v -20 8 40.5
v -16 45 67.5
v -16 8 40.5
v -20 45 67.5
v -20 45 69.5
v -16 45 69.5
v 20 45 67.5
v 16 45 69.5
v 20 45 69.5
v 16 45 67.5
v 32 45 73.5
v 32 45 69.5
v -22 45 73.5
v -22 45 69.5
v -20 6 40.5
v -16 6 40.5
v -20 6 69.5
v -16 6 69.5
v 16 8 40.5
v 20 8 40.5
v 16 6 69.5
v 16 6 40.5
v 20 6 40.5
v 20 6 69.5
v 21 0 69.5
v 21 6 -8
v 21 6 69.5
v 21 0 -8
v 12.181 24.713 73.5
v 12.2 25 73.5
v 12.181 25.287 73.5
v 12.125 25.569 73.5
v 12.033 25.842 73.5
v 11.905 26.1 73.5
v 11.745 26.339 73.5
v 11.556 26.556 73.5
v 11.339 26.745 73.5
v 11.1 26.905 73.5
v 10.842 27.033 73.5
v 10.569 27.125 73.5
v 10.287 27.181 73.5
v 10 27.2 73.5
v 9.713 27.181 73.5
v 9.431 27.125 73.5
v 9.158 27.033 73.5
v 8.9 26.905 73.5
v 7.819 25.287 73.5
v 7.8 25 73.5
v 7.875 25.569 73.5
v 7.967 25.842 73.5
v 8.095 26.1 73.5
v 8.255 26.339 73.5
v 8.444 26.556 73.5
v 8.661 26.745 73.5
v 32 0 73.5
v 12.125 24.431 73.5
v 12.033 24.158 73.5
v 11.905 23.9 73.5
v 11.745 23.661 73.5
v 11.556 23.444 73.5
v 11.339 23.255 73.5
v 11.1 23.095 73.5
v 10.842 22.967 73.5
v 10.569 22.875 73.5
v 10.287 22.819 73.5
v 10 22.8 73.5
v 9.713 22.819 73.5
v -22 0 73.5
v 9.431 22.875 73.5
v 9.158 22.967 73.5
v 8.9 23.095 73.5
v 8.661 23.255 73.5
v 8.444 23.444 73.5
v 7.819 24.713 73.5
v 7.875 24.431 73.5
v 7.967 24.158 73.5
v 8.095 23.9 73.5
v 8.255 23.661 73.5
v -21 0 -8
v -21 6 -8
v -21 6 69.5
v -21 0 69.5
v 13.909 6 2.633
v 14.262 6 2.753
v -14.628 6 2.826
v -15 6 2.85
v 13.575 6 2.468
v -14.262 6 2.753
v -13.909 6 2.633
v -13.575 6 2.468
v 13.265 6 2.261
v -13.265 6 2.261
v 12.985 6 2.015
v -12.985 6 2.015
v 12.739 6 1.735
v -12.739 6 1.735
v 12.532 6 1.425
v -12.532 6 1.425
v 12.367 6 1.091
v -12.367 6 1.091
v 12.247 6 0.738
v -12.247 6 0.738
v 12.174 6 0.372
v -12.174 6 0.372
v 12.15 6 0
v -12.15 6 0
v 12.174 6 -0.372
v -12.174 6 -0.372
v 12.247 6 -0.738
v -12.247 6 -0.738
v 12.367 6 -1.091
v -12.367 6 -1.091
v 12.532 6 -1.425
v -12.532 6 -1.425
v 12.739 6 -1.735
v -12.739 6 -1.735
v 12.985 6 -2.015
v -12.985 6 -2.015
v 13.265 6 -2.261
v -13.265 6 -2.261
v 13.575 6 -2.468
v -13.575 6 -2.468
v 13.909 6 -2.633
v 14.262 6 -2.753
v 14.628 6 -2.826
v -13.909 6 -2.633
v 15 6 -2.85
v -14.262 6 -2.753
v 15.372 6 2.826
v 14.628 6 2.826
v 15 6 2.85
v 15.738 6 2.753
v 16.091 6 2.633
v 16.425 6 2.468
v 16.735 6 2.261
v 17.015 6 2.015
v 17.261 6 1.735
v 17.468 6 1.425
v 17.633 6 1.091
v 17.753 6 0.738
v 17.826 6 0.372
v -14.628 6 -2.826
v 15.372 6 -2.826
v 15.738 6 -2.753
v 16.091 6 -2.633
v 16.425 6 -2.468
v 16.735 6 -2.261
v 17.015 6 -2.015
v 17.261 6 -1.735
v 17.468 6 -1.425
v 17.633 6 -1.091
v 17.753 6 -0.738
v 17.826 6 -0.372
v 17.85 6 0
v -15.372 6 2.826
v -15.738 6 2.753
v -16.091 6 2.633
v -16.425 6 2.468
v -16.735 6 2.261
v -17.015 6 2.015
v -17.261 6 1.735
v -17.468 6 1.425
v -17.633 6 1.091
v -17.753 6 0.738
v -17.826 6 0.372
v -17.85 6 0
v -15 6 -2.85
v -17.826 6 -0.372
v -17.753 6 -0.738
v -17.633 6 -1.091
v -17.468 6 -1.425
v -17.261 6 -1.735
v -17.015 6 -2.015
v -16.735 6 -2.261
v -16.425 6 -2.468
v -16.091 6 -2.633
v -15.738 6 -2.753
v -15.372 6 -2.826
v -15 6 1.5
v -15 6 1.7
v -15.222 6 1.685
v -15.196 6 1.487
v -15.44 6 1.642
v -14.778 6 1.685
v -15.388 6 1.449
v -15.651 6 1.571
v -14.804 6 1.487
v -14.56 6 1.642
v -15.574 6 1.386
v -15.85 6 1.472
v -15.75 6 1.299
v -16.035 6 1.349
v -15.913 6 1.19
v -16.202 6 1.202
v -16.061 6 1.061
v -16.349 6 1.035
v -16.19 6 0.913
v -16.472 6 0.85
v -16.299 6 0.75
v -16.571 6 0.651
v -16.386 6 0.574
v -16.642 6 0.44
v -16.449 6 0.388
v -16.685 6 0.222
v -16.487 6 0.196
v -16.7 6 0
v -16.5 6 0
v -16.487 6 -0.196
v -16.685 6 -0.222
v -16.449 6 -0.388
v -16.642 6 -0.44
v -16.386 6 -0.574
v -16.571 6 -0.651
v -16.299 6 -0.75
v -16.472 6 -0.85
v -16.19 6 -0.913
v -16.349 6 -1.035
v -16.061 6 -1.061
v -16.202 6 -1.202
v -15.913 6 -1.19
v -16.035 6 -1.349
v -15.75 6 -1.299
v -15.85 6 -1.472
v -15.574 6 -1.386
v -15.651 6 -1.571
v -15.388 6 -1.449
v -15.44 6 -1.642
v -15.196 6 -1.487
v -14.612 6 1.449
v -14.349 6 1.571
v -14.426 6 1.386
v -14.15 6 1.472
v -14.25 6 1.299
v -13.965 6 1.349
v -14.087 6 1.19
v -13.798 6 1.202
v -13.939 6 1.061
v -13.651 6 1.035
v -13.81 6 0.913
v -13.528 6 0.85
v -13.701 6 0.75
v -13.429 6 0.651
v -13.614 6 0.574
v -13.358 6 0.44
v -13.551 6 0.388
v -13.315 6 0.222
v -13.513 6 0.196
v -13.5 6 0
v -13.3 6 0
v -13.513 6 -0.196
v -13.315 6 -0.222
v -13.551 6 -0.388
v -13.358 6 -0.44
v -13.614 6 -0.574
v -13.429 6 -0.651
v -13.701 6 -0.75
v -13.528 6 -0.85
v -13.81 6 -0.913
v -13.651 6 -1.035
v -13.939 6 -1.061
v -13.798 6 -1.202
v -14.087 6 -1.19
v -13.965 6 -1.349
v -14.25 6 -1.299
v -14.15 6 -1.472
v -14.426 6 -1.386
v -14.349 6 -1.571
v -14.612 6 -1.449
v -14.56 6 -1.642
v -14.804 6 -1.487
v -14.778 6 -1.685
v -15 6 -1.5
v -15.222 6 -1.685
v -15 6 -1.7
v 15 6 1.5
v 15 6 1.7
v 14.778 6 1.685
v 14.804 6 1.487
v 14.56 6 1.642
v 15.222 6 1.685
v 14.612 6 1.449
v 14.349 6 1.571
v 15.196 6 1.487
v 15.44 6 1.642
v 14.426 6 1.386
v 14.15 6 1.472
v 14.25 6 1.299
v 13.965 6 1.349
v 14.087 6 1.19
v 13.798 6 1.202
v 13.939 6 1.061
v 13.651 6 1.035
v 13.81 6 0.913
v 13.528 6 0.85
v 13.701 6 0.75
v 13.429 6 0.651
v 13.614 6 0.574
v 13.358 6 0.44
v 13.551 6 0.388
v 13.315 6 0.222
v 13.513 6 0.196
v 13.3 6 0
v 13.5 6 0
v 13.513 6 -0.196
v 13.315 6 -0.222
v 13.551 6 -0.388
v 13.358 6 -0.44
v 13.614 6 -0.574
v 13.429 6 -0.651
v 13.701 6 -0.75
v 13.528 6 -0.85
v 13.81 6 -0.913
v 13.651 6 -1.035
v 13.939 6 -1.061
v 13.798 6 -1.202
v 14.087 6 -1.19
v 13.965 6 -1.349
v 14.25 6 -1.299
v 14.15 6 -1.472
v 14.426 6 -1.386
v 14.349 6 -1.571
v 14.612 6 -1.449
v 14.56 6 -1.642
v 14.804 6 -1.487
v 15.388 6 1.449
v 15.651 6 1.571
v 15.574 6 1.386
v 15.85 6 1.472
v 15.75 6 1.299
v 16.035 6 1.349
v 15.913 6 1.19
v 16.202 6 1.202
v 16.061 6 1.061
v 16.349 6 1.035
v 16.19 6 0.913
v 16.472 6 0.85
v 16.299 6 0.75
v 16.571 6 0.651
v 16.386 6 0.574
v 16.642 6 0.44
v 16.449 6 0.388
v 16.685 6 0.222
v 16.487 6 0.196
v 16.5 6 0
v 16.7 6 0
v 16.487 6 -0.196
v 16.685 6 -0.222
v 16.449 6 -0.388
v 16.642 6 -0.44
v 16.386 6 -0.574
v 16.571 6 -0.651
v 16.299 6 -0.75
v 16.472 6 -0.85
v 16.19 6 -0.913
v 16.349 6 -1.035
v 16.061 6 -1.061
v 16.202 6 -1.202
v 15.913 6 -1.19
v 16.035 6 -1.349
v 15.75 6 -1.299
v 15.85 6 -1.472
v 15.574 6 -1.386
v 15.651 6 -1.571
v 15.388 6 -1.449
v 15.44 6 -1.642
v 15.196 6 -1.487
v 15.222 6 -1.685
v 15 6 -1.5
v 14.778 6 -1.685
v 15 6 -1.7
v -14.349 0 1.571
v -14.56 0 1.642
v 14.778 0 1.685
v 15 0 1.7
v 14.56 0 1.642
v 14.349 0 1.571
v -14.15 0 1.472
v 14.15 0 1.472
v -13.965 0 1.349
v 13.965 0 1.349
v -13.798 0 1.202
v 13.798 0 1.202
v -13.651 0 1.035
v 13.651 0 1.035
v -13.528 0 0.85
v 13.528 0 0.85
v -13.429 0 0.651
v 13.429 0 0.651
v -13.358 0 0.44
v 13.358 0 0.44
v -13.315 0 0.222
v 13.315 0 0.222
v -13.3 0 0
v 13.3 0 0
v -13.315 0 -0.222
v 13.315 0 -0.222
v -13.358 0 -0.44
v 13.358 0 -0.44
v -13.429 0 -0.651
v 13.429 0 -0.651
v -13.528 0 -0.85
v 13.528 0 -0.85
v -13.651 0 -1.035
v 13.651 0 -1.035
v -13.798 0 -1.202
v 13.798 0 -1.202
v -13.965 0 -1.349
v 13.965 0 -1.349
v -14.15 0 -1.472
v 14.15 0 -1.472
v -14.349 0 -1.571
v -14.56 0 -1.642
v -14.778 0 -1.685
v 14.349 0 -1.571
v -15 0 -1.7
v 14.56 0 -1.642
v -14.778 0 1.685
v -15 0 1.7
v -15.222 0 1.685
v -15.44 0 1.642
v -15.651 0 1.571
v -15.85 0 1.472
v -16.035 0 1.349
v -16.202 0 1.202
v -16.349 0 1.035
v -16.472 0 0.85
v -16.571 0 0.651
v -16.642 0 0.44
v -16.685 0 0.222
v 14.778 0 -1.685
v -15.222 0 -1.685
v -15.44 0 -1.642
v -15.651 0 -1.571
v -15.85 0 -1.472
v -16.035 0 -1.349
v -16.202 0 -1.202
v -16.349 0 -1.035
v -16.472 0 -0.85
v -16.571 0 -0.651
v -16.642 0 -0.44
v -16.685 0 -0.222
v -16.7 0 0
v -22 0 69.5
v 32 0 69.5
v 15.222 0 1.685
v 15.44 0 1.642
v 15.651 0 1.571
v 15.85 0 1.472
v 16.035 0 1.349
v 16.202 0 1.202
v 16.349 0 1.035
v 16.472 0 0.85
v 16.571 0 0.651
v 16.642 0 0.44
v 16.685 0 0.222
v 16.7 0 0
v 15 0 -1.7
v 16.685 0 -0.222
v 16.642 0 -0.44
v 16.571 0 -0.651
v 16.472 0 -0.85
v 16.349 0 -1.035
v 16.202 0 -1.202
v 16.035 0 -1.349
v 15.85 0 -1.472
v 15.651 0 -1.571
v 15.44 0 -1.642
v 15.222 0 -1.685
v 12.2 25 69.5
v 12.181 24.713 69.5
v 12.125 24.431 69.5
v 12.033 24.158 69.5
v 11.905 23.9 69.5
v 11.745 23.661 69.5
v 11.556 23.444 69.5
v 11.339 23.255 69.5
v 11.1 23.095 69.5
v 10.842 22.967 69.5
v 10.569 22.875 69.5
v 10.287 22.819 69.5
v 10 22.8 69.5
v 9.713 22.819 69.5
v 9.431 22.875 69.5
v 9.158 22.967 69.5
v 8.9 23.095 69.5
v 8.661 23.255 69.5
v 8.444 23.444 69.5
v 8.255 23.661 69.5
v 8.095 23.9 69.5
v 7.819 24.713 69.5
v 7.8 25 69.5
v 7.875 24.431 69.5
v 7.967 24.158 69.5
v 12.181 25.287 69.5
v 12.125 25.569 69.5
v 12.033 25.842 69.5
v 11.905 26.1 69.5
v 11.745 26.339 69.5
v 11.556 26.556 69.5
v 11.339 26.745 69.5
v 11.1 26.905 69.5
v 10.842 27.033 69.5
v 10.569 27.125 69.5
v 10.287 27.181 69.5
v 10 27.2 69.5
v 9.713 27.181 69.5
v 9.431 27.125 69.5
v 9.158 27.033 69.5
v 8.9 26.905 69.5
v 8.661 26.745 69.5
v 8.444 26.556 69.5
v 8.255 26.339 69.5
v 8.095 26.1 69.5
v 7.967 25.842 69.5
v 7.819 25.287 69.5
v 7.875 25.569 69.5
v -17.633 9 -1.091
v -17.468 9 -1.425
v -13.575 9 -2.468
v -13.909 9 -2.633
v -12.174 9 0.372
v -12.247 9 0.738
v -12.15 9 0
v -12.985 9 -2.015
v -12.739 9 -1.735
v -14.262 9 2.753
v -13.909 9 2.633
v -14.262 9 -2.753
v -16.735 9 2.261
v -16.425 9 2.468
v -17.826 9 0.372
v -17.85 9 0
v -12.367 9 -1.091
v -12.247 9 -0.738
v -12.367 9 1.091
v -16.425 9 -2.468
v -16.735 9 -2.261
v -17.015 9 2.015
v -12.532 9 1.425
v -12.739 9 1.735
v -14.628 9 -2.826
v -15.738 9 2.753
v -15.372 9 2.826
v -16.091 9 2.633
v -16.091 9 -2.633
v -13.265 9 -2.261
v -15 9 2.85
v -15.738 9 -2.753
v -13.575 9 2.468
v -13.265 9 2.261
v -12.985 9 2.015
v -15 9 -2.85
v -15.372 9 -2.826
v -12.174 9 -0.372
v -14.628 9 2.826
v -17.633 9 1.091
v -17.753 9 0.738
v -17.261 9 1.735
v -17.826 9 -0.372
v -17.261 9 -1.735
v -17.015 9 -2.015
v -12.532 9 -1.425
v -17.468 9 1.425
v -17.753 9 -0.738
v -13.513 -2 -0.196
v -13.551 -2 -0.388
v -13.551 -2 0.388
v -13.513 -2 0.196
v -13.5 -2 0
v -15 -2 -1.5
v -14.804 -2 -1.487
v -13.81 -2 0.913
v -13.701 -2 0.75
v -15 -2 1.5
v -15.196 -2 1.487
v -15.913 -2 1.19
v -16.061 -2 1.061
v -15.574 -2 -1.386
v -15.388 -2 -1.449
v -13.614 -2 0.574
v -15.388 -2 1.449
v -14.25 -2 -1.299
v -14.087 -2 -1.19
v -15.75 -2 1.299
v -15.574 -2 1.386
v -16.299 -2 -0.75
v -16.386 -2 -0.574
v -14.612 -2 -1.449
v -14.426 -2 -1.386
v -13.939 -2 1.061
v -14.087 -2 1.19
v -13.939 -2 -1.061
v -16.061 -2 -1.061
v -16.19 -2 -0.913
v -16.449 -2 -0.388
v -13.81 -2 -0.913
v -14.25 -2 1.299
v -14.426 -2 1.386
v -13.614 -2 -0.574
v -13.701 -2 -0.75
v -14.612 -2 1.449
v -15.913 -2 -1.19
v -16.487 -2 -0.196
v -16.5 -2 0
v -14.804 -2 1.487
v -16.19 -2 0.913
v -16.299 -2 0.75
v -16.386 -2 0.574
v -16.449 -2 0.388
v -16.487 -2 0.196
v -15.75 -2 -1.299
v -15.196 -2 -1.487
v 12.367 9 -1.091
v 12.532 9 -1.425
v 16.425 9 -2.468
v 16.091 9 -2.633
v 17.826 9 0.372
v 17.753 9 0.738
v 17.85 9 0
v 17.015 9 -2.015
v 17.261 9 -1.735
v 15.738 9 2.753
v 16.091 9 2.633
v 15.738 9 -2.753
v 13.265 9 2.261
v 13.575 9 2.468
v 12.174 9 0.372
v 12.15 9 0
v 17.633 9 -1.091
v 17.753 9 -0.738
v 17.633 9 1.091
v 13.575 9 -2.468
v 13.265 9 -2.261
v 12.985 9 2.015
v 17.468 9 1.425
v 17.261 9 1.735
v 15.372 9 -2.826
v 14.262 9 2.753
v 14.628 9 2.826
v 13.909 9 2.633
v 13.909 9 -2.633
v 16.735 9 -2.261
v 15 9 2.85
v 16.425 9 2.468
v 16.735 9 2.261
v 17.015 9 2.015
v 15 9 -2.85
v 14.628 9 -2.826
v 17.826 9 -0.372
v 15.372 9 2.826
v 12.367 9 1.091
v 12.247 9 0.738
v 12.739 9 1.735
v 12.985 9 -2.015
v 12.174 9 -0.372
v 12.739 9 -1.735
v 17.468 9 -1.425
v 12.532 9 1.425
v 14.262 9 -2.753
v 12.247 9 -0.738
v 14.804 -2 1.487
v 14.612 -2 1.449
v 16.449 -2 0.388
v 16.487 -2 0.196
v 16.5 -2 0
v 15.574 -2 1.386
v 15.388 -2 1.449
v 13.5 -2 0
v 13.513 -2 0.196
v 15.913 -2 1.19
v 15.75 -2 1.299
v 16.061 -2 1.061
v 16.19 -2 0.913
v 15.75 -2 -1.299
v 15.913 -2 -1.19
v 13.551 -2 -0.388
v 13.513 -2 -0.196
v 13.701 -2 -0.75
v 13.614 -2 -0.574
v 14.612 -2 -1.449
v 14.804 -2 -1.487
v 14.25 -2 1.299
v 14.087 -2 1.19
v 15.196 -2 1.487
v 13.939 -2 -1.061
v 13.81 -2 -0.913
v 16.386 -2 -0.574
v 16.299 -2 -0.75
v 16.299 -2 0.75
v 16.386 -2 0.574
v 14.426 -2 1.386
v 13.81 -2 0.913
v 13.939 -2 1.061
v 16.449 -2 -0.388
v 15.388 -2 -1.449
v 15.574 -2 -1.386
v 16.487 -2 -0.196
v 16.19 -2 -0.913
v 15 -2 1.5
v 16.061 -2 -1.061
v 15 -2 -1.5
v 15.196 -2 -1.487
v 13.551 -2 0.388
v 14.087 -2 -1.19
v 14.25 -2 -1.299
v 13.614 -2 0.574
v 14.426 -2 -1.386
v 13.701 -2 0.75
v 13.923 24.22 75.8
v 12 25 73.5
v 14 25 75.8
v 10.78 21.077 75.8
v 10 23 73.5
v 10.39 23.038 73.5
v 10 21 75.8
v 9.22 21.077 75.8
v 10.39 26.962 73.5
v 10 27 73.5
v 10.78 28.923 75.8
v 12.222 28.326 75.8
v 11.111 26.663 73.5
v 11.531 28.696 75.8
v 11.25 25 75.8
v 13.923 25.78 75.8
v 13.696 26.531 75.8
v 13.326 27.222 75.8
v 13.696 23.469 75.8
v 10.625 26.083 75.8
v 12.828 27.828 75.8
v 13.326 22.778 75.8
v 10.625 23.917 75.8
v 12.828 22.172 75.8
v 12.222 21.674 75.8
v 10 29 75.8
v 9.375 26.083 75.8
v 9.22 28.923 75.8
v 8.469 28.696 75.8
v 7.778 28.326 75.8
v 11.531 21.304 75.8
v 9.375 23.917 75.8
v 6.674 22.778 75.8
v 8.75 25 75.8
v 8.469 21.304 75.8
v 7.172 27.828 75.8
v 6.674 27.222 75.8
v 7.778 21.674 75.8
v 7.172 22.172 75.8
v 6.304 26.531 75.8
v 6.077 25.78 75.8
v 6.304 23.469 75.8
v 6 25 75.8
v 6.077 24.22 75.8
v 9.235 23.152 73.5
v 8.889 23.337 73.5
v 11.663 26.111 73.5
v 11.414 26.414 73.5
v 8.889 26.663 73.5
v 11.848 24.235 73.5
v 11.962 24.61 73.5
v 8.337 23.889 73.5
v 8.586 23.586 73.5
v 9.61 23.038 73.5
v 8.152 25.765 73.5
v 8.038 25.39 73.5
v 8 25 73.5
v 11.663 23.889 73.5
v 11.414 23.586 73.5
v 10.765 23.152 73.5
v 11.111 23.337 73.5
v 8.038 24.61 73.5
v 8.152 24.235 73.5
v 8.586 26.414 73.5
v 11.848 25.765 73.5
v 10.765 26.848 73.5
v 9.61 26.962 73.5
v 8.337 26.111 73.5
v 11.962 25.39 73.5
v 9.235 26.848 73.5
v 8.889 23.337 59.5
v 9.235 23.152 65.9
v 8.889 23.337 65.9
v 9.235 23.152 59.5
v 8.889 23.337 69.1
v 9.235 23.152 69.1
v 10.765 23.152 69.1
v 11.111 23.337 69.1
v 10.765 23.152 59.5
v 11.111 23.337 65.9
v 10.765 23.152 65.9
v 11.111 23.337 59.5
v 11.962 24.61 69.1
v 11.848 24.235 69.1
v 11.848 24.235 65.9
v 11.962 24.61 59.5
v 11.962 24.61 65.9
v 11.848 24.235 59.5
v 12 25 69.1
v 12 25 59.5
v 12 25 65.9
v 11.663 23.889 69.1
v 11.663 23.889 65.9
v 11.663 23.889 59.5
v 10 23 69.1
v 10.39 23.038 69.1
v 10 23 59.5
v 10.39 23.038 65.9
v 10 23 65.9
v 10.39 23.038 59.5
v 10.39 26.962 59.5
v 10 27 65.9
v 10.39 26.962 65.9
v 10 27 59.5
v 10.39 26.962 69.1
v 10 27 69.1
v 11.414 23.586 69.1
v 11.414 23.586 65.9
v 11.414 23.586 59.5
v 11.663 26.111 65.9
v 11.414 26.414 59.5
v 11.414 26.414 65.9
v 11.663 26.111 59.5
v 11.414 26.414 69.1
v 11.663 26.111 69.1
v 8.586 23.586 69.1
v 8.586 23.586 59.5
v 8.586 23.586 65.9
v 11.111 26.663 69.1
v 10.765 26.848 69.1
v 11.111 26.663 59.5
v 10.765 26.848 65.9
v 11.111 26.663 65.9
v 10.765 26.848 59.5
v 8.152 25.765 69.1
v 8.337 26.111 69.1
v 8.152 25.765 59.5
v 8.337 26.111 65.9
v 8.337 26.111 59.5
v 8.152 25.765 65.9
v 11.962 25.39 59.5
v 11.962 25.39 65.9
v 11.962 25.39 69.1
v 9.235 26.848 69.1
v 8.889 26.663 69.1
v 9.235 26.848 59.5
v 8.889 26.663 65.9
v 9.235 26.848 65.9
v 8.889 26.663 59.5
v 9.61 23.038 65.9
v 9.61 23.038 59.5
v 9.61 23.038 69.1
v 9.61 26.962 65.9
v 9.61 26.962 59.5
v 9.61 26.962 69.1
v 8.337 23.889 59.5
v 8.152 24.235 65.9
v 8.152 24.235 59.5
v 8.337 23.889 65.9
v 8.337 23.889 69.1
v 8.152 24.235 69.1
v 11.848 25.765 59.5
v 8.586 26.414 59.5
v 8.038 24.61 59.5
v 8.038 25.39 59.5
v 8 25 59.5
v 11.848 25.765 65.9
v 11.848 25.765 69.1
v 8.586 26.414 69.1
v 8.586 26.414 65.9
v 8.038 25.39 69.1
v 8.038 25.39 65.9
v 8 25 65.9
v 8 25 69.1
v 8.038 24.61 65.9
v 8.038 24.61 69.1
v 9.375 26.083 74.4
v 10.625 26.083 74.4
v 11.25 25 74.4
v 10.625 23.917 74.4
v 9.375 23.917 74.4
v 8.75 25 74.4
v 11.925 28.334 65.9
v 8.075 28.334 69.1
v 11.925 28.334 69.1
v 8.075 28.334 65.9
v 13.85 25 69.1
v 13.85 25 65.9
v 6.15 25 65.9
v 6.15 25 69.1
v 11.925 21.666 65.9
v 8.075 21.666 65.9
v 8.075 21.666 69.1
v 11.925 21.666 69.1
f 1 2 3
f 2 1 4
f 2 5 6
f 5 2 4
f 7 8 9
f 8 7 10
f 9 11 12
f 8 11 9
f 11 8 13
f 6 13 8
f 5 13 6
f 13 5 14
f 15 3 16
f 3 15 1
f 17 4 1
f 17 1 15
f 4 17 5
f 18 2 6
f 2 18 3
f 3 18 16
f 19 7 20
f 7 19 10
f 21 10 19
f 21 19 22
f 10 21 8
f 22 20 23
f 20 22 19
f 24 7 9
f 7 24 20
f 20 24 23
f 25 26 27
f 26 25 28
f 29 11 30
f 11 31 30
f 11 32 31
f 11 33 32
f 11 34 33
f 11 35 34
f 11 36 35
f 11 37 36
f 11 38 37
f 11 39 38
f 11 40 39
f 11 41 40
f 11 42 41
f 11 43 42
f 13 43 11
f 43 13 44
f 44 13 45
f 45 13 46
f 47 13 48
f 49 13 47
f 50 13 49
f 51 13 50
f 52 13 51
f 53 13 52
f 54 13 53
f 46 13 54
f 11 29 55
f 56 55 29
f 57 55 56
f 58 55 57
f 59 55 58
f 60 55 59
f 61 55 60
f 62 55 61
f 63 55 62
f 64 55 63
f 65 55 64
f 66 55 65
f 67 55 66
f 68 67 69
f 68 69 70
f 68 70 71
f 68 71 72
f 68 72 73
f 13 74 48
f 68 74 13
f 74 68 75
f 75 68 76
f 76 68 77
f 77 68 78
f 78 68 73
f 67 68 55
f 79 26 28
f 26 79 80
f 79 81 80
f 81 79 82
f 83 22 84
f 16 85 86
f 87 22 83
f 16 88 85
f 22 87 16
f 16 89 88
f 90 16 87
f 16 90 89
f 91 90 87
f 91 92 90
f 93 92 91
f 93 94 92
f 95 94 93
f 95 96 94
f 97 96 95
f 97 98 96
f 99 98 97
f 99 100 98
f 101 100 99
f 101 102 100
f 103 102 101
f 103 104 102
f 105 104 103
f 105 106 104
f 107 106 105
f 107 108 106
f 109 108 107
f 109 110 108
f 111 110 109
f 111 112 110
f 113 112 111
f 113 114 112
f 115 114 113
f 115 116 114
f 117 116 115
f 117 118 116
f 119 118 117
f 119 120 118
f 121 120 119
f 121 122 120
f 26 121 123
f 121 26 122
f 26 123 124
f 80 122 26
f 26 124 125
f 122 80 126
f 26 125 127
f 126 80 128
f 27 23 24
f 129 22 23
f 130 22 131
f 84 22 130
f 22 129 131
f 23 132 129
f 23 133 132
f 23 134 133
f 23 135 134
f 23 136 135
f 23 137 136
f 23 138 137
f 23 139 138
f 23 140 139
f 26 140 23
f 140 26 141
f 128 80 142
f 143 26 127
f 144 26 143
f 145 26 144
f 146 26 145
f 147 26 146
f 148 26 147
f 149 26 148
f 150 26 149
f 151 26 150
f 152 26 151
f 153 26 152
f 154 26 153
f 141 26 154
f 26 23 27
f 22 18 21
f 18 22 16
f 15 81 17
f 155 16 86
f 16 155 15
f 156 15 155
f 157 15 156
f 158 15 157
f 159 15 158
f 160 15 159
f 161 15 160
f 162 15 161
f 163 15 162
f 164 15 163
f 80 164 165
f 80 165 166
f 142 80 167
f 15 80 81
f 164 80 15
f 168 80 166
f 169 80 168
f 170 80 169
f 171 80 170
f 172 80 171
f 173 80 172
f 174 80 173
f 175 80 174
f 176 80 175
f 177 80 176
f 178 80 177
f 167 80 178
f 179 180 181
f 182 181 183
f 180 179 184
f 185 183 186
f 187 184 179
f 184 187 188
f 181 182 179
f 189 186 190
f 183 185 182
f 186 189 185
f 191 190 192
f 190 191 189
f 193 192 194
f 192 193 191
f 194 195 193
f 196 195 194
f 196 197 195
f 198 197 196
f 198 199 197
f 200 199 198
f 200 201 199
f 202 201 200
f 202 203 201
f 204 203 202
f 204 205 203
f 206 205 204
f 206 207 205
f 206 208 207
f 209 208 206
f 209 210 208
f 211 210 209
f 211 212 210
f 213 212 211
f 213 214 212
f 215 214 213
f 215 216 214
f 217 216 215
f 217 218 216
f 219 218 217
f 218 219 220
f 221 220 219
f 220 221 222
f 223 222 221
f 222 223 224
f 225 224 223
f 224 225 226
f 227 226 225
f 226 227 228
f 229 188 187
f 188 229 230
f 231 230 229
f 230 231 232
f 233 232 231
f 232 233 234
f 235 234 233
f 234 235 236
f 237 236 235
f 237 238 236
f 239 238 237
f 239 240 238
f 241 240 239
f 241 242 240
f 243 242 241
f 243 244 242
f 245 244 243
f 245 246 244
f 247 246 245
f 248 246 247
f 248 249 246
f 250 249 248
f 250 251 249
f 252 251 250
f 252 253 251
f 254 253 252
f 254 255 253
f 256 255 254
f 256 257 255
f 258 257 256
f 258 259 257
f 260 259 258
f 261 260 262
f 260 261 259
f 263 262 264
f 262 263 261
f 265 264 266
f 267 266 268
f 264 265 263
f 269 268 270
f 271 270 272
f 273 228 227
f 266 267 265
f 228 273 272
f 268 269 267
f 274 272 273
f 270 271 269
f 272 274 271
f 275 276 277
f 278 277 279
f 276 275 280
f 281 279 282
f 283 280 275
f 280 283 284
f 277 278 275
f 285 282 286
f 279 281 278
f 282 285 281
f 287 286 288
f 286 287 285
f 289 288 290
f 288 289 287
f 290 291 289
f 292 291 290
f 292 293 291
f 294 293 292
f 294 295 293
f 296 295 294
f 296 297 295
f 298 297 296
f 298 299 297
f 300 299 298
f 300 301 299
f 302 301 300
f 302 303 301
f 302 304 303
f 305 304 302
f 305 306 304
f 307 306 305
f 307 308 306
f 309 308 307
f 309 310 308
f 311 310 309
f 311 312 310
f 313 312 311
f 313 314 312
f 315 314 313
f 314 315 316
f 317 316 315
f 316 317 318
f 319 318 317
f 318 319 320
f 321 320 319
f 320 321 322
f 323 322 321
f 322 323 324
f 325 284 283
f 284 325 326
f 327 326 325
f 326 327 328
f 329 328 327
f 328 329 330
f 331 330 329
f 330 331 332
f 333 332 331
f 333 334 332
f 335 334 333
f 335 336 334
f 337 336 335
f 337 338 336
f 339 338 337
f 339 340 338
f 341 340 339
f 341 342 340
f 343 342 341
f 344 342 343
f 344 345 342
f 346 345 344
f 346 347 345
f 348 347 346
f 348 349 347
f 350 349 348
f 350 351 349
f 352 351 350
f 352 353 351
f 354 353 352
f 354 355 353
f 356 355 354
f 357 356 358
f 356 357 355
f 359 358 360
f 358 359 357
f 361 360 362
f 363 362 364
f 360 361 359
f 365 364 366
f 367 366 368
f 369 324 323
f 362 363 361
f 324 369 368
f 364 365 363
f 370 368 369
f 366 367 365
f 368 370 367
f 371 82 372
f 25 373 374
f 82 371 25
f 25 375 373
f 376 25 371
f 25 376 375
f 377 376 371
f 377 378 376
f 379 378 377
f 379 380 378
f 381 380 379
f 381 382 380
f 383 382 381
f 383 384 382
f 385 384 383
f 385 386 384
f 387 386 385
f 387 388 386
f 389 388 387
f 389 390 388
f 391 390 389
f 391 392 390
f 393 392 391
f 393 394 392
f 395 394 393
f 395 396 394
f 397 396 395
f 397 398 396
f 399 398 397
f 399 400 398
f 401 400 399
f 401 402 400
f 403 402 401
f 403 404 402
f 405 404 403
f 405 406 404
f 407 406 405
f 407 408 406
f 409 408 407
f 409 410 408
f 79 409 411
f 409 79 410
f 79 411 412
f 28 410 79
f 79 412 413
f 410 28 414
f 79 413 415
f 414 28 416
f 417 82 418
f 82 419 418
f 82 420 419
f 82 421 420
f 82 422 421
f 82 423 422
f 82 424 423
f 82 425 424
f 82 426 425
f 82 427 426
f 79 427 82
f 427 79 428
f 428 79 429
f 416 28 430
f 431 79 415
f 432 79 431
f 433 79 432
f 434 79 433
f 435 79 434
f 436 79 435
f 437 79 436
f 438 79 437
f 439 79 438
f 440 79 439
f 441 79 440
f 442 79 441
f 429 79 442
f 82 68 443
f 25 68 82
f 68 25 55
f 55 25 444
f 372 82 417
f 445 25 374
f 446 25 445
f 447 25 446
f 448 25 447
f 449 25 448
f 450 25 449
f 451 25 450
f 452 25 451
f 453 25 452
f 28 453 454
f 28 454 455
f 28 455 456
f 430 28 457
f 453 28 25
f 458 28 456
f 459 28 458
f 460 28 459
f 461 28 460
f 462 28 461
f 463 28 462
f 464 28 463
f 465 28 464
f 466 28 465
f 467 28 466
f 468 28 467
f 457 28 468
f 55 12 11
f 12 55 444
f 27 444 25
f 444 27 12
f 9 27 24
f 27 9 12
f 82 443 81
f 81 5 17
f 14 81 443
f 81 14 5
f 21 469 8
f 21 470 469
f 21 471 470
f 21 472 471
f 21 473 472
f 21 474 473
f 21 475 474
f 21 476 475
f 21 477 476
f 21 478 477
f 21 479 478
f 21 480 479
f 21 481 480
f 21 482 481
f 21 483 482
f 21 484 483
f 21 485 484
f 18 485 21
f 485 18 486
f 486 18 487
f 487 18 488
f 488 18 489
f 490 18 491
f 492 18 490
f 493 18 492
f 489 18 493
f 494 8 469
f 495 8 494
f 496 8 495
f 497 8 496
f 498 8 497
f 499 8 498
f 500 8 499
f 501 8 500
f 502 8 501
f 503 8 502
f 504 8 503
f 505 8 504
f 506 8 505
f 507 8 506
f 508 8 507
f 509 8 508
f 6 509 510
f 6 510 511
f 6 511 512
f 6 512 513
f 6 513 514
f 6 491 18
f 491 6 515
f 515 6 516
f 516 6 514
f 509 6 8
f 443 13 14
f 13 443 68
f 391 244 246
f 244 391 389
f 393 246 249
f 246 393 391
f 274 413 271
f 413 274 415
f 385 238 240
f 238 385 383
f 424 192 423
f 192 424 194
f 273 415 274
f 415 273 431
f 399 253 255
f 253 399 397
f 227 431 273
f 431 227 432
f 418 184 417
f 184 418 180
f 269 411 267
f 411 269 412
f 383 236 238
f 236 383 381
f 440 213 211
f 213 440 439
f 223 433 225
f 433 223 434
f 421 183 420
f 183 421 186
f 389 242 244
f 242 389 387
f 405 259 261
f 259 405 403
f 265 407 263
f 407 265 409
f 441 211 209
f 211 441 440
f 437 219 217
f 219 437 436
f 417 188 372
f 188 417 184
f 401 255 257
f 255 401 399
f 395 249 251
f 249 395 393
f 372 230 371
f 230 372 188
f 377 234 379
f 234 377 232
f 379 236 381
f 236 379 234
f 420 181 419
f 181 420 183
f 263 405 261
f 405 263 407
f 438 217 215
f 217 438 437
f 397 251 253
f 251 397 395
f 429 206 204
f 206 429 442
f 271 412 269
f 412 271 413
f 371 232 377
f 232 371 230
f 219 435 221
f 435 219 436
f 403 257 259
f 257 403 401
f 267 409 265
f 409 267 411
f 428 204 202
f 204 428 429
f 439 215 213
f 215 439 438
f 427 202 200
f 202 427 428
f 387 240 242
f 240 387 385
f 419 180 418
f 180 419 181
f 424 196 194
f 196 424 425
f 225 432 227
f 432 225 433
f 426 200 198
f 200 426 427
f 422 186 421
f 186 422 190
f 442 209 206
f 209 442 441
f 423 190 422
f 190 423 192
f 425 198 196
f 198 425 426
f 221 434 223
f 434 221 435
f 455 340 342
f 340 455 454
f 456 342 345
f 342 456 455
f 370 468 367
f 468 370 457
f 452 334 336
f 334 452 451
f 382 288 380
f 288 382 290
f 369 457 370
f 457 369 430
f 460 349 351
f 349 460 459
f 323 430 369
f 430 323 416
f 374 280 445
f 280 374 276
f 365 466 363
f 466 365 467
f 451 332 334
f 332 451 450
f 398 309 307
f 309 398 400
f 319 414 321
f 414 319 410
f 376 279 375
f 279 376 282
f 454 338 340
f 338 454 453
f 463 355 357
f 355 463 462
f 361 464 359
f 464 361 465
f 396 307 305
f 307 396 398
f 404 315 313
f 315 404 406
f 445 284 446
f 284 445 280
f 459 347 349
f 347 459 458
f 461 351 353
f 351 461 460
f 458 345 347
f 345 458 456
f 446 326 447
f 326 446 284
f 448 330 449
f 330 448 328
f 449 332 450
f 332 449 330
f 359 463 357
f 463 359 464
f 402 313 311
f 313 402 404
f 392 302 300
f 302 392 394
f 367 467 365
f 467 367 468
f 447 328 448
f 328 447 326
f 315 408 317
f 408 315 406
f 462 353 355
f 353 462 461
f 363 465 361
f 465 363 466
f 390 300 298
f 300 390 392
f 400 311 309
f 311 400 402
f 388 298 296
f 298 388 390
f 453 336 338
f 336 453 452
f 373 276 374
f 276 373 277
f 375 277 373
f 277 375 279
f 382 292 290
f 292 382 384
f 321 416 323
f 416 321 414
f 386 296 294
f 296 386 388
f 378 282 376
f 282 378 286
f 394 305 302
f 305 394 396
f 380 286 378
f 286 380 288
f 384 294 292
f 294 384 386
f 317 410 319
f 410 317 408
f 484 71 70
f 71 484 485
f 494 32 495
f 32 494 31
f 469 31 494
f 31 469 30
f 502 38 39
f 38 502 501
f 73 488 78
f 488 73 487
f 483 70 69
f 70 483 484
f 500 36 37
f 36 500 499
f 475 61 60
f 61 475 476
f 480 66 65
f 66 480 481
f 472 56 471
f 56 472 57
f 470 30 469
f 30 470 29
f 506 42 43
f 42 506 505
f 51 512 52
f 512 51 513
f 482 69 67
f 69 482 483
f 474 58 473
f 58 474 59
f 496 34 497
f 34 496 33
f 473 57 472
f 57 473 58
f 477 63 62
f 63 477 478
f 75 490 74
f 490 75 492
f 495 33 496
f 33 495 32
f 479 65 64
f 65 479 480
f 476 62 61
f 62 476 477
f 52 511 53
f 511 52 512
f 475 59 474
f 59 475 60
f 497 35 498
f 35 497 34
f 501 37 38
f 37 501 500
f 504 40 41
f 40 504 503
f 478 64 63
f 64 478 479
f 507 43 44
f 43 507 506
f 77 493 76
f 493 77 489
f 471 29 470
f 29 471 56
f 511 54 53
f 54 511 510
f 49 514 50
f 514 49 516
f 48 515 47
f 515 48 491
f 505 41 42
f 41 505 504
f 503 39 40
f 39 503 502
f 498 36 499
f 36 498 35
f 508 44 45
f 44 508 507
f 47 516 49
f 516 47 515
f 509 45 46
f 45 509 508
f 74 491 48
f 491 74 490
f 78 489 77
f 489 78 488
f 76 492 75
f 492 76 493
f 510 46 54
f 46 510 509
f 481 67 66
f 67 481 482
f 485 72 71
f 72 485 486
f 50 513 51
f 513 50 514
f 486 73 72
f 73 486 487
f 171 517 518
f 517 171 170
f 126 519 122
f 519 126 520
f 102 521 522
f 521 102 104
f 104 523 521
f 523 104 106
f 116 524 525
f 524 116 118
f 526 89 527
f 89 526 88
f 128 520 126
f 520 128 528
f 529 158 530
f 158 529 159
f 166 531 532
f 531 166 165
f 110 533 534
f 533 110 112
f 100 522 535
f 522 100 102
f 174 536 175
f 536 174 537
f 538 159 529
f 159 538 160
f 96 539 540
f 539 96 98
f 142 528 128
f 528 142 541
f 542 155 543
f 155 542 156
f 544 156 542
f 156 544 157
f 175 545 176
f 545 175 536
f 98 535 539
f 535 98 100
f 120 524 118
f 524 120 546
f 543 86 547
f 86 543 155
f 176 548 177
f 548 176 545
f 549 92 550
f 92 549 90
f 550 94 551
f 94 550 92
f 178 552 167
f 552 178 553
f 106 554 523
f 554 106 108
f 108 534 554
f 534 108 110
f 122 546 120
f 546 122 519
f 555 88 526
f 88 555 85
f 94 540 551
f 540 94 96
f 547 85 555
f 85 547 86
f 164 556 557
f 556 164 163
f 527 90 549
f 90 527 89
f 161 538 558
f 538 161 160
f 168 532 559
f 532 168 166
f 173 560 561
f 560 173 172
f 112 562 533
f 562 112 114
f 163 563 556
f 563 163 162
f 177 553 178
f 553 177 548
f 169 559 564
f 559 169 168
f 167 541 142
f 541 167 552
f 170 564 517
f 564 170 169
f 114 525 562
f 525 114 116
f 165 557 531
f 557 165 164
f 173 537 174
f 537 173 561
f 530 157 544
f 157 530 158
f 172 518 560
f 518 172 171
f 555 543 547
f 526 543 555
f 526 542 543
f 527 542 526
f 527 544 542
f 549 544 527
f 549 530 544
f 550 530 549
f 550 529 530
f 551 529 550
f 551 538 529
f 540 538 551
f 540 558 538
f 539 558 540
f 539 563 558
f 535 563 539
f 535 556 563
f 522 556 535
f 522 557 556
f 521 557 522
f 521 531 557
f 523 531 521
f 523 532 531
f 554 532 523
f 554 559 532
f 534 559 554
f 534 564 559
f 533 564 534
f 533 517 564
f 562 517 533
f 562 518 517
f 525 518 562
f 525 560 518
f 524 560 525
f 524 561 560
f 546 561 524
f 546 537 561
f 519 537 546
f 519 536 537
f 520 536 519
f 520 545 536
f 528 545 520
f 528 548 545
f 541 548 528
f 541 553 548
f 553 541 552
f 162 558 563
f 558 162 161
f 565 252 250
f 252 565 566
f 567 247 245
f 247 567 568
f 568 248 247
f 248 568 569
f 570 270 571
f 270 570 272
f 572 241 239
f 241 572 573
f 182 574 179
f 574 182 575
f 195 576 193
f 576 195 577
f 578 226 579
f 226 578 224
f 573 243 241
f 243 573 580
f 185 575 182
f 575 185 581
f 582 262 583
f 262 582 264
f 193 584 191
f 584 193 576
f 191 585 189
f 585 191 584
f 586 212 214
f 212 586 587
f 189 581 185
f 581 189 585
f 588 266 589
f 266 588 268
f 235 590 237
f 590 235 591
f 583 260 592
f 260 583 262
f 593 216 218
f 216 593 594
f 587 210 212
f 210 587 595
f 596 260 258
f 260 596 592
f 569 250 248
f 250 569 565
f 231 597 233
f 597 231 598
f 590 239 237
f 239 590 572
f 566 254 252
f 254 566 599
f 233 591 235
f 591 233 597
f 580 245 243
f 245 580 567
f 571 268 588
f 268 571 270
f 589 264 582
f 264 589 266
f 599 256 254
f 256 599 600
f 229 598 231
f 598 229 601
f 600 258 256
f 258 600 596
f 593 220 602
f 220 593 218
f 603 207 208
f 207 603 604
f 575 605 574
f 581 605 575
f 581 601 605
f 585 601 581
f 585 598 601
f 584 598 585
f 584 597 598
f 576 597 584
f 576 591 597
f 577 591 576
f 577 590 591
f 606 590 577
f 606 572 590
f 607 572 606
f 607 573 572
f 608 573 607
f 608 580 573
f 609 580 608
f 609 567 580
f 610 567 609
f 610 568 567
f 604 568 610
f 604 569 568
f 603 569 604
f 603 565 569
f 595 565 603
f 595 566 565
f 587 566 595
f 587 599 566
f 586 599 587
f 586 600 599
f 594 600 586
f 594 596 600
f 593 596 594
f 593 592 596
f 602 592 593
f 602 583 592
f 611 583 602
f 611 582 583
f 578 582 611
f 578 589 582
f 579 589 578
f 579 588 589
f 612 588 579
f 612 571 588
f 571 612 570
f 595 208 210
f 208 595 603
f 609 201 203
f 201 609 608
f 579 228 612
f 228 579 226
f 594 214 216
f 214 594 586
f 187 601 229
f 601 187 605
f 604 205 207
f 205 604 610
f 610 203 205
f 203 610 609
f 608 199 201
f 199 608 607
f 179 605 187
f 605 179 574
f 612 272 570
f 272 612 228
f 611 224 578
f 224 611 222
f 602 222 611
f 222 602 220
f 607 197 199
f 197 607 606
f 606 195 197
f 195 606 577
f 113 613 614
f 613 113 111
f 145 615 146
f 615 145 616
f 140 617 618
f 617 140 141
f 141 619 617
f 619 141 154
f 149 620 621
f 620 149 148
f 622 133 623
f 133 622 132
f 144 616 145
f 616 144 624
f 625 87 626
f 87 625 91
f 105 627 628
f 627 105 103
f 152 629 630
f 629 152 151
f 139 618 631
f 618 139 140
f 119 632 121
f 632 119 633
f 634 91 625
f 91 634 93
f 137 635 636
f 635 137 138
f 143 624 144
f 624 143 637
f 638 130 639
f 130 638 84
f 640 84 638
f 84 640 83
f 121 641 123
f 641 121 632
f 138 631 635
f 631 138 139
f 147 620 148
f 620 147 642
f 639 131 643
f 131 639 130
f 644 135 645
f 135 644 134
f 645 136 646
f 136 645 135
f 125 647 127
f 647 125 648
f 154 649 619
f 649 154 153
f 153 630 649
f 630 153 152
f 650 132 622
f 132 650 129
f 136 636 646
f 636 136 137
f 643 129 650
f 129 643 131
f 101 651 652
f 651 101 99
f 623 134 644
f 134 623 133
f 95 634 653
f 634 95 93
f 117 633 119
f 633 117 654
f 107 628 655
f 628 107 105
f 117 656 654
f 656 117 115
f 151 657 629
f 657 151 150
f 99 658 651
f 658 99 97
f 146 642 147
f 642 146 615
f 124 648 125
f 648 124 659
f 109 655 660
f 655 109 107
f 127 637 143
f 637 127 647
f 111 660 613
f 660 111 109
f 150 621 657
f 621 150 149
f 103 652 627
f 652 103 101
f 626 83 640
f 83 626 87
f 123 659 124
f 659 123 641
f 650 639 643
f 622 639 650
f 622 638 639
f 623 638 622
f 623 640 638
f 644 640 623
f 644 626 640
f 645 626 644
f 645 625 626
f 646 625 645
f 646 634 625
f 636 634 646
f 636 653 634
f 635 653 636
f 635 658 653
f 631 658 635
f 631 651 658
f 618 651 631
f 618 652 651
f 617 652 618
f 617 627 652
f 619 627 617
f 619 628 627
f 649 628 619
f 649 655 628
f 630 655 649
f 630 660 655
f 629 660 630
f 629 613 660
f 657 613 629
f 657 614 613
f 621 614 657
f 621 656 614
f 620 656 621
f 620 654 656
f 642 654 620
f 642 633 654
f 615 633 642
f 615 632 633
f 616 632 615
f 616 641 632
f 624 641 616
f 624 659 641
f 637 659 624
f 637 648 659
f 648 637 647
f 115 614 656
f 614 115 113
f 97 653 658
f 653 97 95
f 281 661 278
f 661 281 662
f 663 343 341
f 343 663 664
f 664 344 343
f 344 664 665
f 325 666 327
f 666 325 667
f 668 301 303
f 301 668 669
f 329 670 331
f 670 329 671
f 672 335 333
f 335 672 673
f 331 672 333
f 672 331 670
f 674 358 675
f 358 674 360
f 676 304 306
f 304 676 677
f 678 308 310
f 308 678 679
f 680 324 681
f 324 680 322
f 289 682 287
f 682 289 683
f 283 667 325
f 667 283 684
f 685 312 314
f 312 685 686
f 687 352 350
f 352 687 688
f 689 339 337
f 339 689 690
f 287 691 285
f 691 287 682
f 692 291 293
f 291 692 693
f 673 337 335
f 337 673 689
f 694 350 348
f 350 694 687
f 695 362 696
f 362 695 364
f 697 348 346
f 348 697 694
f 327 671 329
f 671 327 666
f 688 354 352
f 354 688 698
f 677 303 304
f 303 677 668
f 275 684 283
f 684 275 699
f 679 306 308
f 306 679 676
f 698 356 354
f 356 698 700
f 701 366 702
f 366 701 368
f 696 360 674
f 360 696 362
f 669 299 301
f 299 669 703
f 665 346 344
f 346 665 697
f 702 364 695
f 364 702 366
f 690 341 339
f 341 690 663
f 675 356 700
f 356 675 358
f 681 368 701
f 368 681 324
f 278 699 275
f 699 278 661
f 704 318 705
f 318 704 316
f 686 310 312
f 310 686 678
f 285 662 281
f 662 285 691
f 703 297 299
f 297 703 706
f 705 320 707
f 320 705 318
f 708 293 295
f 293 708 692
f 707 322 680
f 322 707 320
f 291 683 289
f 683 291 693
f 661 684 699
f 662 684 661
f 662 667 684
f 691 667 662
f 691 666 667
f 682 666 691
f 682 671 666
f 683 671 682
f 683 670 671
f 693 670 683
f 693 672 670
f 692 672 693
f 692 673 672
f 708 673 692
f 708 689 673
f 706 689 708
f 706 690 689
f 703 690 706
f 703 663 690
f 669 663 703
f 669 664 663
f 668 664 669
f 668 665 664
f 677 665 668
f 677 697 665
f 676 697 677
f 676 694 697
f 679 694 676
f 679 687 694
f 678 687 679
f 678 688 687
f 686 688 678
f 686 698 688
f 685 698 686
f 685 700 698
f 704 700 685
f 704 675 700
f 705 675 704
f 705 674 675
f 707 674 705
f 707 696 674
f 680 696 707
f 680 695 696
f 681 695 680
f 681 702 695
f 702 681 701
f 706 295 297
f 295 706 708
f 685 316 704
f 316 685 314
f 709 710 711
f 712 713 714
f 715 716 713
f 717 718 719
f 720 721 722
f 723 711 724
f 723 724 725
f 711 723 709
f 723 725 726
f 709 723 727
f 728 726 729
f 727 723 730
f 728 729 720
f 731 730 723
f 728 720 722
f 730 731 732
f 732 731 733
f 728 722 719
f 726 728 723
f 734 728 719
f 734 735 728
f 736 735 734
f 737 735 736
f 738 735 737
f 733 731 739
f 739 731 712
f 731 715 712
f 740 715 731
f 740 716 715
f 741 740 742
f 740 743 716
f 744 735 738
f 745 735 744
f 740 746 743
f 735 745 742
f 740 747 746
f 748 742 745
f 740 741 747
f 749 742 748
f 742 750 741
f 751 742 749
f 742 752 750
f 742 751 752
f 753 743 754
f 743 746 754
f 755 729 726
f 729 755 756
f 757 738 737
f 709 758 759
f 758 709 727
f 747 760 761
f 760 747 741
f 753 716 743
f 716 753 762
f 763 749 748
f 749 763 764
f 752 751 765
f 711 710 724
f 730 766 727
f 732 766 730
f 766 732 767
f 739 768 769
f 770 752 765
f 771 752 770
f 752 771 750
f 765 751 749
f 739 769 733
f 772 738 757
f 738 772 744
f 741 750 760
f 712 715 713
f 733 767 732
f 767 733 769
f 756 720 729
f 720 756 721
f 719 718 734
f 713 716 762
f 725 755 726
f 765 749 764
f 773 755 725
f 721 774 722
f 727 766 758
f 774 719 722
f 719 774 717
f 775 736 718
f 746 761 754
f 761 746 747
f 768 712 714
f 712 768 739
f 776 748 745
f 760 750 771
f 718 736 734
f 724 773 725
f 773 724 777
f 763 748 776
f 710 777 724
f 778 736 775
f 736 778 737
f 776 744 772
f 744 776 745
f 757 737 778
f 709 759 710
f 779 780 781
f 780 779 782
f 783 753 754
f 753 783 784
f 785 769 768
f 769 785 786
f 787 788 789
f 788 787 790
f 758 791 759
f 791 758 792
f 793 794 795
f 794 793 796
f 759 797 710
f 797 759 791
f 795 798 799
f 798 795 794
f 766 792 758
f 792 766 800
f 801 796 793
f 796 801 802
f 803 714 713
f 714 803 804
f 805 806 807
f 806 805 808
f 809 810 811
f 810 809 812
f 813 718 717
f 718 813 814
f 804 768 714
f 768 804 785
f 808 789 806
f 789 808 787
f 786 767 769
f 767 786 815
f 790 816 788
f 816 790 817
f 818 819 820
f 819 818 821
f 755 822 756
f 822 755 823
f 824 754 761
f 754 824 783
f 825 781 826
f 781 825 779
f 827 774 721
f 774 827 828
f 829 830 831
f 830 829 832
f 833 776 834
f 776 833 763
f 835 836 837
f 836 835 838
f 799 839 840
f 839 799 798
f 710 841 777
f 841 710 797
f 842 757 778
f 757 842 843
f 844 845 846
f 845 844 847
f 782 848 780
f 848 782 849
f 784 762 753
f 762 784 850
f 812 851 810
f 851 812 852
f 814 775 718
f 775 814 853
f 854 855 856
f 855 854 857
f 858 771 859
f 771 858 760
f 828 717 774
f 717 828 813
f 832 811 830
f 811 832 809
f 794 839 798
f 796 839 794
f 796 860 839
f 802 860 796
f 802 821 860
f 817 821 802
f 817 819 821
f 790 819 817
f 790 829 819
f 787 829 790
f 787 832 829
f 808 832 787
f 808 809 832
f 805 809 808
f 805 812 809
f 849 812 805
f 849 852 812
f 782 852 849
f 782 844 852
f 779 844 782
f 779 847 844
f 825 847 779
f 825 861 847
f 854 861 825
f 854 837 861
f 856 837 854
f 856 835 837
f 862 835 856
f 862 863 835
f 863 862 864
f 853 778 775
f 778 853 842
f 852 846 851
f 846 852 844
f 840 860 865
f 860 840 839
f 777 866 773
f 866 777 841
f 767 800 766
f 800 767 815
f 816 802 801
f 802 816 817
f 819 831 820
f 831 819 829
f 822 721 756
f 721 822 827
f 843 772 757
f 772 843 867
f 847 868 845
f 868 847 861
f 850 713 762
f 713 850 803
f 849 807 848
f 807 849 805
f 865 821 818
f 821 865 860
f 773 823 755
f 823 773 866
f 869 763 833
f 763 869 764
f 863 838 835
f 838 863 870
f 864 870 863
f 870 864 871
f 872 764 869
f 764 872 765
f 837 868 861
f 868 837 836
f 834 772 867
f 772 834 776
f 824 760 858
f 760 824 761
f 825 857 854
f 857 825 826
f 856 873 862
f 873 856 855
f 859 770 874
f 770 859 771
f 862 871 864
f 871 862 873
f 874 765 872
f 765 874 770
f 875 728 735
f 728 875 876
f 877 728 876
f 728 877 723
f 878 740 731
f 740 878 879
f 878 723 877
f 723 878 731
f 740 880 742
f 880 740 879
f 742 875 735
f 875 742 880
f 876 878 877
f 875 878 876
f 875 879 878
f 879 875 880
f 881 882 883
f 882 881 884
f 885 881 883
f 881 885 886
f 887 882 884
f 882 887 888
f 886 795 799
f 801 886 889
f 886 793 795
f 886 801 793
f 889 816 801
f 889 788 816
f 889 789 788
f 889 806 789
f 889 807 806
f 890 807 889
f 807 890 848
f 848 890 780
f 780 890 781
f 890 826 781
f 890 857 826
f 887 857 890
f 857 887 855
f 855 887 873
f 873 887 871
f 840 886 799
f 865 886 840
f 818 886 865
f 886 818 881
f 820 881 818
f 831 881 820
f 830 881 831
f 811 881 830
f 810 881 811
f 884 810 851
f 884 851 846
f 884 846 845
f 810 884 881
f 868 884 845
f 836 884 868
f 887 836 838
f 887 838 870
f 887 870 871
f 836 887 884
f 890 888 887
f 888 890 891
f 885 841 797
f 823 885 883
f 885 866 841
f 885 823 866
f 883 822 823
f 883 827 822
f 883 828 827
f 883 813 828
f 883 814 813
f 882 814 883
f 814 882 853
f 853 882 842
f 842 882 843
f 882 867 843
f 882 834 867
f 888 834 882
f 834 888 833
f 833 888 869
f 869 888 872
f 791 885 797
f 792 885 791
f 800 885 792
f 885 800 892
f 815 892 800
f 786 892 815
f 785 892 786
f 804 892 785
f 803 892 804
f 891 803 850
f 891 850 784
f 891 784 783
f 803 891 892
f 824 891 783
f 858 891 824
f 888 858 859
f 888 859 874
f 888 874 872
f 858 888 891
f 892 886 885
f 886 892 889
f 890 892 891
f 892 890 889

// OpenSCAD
// file: fhcs.scad
// =======================================================================
// PARAMETRIC FLAT HEAD COUNTERSUNK SCREW (FHCS) LIBRARY
// =======================================================================

// 1. Render Example Setup
translate([-20, 0, 0]) m3_fhcs(length=8);
translate([0, 0, 0])   m4_fhcs(length=10);
translate([20, 0, 0])  m5_fhcs(length=12); // New M5 Option Added Below

// =======================================================================
// HARDWARE MODULE DEFINITIONS
// =======================================================================

module m3_fhcs(length=8) {
    // M3 Flat Head Countersunk Screw
    // head: 6mm dia at top (wide end flush with surface), tapers to 3mm at shaft
    // shaft: 3mm dia, variable length
    color("silver")
    difference() {
        union() {
            // Conical head (wide end at top, narrows toward shaft)
            translate([0, 0, -1.7])
                cylinder(d1=6, d2=3, h=1.7, $fn=32);
            // Shaft (goes up)
            cylinder(d=3, h=length, $fn=32);
        }
        // Hex drive recess (from the wide/top end)
        translate([0, 0, -1.8])
            cylinder(d=2, h=1.2, $fn=6);
    }
}

module m4_fhcs(length=10) {
    // M4 Flat Head Countersunk Screw
    // head: 8mm dia at top (wide end flush with surface), tapers to 4mm at shaft
    // shaft: 4mm dia, variable length
    color("silver")
    difference() {
        union() {
            // Conical head (wide end at top, narrows toward shaft)
            translate([0, 0, -2.3])
                cylinder(d1=8, d2=4, h=2.3, $fn=32);
            // Shaft (goes up)
            cylinder(d=4, h=length, $fn=32);
        }
        // Hex drive recess (from the wide/top end)
        translate([0, 0, -2.4])
            cylinder(d=2.5, h=1.5, $fn=6);
    }
}

module m5_fhcs(length=12) {
    // M5 Flat Head Countersunk Screw (ISO 10642 / DIN 7991 Standard)
    // head: 11.2mm dia at top (wide end flush with surface), tapers to 5mm at shaft
    // shaft: 5mm dia, variable length
    color("silver")
    difference() {
        union() {
            // Conical head (wide end at top, narrows toward shaft)
            translate([0, 0, -3.1])
                cylinder(d1=11.2, d2=5, h=3.1, $fn=32);
            // Shaft (goes up)
            cylinder(d=5, h=length, $fn=32);
        }
        // Hex drive recess (fits a standard 3mm hex allen key drive)
        translate([0, 0, -3.2])
            cylinder(d=3, h=1.9, $fn=6);
    }
}
// main file
// Opposite-side drag-chain bracket for the A4/MGN12H X carriage.
// Local origin: midpoint of the two existing M3 tapped holes on the +Y end
// face of MGN12HAdapterPlateAssembly(). The bracket grows toward +Y and +Z.

use <fhcs.scad>;

$fn = 48;

module x_drag_chain_carriage_bracket(show_hardware=true,
                                     body_color=[0.70, 0.04, 0.06],
                                     shelf_top_z=73.5) {
    mount_hole_spacing = 30;
    vertical_width = 42;
    vertical_bottom_z = -8;
    vertical_height = shelf_top_z - vertical_bottom_z;
    vertical_thickness = 6;
    shelf_width = 54;
    shelf_depth = 45;
    shelf_thickness = 4;
    chain_bolt_x = 10;
    chain_bolt_y = 25;

    color(body_color)
        difference() {
            union() {
                // Plate bolts directly to the carriage's existing two-hole
                // M3 end-face pattern.
                translate([0, vertical_thickness / 2,
                           vertical_bottom_z + vertical_height / 2])
                    cube([vertical_width, vertical_thickness,
                          vertical_height], center=true);

                // Horizontal shelf supports the inverted red connector tab.
                translate([5, shelf_depth / 2,
                           shelf_top_z - shelf_thickness / 2])
                    cube([shelf_width, shelf_depth, shelf_thickness],
                         center=true);

                // Two triangular side gussets resist cable-chain torque.
                for (x = [-18, 18])
                    hull() {
                        translate([x, vertical_thickness,
                                   shelf_top_z - 18])
                            cube([4, 4, 30], center=true);
                        translate([x, shelf_depth - 4,
                                   shelf_top_z - shelf_thickness])
                            cube([4, 8, shelf_thickness], center=true);
                    }
            }

            // M3 clearance bores align with the tapped A4 end-face holes.
            for (x = [-mount_hole_spacing / 2,
                       mount_hole_spacing / 2])
                translate([x, vertical_thickness / 2, 0])
                    rotate([90, 0, 0])
                        cylinder(d=3.4, h=vertical_thickness + 2,
                                 center=true);

            // M4 clearance hole receives the red connector's adjustment slot.
            translate([chain_bolt_x, chain_bolt_y,
                       shelf_top_z - shelf_thickness / 2])
                cylinder(d=4.4, h=shelf_thickness + 2, center=true);
        }

    if (show_hardware) {
        // Two M3 SHCS heads on the accessible outside face.
        color([0.62, 0.63, 0.64])
            for (x = [-mount_hole_spacing / 2,
                       mount_hole_spacing / 2]) {
                translate([x, vertical_thickness + 1.5, 0])
                    rotate([90, 0, 0])
                        cylinder(d=5.7, h=3, center=true);
                translate([x, vertical_thickness / 2, 0])
                    rotate([90, 0, 0])
                        cylinder(d=3, h=10, center=true);
            }

        // M4 FHCS installs from above and seats flush in the countersunk,
        // inverted drag-chain connector; its nut remains beneath the shelf.
        // The library model's shaft points +Z and its head extends toward -Z.
        // Flip it so the FHCS installs downward from the accessible top face.
        // The connector ear's underside lands directly on shelf_top_z.  The
        // FHCS head/shaft junction therefore begins at that same interface.
        translate([chain_bolt_x, chain_bolt_y, shelf_top_z])
            rotate([180, 0, 0])
                m4_fhcs(length=14);
        color([0.42, 0.43, 0.44])
            translate([chain_bolt_x, chain_bolt_y,
                       shelf_top_z - shelf_thickness - 2])
                cylinder(d=7.7, h=3.2, center=true, $fn=6);
    }
}

// Standalone CNC/printing preview. Ignored when imported with `use`.
x_drag_chain_carriage_bracket();
